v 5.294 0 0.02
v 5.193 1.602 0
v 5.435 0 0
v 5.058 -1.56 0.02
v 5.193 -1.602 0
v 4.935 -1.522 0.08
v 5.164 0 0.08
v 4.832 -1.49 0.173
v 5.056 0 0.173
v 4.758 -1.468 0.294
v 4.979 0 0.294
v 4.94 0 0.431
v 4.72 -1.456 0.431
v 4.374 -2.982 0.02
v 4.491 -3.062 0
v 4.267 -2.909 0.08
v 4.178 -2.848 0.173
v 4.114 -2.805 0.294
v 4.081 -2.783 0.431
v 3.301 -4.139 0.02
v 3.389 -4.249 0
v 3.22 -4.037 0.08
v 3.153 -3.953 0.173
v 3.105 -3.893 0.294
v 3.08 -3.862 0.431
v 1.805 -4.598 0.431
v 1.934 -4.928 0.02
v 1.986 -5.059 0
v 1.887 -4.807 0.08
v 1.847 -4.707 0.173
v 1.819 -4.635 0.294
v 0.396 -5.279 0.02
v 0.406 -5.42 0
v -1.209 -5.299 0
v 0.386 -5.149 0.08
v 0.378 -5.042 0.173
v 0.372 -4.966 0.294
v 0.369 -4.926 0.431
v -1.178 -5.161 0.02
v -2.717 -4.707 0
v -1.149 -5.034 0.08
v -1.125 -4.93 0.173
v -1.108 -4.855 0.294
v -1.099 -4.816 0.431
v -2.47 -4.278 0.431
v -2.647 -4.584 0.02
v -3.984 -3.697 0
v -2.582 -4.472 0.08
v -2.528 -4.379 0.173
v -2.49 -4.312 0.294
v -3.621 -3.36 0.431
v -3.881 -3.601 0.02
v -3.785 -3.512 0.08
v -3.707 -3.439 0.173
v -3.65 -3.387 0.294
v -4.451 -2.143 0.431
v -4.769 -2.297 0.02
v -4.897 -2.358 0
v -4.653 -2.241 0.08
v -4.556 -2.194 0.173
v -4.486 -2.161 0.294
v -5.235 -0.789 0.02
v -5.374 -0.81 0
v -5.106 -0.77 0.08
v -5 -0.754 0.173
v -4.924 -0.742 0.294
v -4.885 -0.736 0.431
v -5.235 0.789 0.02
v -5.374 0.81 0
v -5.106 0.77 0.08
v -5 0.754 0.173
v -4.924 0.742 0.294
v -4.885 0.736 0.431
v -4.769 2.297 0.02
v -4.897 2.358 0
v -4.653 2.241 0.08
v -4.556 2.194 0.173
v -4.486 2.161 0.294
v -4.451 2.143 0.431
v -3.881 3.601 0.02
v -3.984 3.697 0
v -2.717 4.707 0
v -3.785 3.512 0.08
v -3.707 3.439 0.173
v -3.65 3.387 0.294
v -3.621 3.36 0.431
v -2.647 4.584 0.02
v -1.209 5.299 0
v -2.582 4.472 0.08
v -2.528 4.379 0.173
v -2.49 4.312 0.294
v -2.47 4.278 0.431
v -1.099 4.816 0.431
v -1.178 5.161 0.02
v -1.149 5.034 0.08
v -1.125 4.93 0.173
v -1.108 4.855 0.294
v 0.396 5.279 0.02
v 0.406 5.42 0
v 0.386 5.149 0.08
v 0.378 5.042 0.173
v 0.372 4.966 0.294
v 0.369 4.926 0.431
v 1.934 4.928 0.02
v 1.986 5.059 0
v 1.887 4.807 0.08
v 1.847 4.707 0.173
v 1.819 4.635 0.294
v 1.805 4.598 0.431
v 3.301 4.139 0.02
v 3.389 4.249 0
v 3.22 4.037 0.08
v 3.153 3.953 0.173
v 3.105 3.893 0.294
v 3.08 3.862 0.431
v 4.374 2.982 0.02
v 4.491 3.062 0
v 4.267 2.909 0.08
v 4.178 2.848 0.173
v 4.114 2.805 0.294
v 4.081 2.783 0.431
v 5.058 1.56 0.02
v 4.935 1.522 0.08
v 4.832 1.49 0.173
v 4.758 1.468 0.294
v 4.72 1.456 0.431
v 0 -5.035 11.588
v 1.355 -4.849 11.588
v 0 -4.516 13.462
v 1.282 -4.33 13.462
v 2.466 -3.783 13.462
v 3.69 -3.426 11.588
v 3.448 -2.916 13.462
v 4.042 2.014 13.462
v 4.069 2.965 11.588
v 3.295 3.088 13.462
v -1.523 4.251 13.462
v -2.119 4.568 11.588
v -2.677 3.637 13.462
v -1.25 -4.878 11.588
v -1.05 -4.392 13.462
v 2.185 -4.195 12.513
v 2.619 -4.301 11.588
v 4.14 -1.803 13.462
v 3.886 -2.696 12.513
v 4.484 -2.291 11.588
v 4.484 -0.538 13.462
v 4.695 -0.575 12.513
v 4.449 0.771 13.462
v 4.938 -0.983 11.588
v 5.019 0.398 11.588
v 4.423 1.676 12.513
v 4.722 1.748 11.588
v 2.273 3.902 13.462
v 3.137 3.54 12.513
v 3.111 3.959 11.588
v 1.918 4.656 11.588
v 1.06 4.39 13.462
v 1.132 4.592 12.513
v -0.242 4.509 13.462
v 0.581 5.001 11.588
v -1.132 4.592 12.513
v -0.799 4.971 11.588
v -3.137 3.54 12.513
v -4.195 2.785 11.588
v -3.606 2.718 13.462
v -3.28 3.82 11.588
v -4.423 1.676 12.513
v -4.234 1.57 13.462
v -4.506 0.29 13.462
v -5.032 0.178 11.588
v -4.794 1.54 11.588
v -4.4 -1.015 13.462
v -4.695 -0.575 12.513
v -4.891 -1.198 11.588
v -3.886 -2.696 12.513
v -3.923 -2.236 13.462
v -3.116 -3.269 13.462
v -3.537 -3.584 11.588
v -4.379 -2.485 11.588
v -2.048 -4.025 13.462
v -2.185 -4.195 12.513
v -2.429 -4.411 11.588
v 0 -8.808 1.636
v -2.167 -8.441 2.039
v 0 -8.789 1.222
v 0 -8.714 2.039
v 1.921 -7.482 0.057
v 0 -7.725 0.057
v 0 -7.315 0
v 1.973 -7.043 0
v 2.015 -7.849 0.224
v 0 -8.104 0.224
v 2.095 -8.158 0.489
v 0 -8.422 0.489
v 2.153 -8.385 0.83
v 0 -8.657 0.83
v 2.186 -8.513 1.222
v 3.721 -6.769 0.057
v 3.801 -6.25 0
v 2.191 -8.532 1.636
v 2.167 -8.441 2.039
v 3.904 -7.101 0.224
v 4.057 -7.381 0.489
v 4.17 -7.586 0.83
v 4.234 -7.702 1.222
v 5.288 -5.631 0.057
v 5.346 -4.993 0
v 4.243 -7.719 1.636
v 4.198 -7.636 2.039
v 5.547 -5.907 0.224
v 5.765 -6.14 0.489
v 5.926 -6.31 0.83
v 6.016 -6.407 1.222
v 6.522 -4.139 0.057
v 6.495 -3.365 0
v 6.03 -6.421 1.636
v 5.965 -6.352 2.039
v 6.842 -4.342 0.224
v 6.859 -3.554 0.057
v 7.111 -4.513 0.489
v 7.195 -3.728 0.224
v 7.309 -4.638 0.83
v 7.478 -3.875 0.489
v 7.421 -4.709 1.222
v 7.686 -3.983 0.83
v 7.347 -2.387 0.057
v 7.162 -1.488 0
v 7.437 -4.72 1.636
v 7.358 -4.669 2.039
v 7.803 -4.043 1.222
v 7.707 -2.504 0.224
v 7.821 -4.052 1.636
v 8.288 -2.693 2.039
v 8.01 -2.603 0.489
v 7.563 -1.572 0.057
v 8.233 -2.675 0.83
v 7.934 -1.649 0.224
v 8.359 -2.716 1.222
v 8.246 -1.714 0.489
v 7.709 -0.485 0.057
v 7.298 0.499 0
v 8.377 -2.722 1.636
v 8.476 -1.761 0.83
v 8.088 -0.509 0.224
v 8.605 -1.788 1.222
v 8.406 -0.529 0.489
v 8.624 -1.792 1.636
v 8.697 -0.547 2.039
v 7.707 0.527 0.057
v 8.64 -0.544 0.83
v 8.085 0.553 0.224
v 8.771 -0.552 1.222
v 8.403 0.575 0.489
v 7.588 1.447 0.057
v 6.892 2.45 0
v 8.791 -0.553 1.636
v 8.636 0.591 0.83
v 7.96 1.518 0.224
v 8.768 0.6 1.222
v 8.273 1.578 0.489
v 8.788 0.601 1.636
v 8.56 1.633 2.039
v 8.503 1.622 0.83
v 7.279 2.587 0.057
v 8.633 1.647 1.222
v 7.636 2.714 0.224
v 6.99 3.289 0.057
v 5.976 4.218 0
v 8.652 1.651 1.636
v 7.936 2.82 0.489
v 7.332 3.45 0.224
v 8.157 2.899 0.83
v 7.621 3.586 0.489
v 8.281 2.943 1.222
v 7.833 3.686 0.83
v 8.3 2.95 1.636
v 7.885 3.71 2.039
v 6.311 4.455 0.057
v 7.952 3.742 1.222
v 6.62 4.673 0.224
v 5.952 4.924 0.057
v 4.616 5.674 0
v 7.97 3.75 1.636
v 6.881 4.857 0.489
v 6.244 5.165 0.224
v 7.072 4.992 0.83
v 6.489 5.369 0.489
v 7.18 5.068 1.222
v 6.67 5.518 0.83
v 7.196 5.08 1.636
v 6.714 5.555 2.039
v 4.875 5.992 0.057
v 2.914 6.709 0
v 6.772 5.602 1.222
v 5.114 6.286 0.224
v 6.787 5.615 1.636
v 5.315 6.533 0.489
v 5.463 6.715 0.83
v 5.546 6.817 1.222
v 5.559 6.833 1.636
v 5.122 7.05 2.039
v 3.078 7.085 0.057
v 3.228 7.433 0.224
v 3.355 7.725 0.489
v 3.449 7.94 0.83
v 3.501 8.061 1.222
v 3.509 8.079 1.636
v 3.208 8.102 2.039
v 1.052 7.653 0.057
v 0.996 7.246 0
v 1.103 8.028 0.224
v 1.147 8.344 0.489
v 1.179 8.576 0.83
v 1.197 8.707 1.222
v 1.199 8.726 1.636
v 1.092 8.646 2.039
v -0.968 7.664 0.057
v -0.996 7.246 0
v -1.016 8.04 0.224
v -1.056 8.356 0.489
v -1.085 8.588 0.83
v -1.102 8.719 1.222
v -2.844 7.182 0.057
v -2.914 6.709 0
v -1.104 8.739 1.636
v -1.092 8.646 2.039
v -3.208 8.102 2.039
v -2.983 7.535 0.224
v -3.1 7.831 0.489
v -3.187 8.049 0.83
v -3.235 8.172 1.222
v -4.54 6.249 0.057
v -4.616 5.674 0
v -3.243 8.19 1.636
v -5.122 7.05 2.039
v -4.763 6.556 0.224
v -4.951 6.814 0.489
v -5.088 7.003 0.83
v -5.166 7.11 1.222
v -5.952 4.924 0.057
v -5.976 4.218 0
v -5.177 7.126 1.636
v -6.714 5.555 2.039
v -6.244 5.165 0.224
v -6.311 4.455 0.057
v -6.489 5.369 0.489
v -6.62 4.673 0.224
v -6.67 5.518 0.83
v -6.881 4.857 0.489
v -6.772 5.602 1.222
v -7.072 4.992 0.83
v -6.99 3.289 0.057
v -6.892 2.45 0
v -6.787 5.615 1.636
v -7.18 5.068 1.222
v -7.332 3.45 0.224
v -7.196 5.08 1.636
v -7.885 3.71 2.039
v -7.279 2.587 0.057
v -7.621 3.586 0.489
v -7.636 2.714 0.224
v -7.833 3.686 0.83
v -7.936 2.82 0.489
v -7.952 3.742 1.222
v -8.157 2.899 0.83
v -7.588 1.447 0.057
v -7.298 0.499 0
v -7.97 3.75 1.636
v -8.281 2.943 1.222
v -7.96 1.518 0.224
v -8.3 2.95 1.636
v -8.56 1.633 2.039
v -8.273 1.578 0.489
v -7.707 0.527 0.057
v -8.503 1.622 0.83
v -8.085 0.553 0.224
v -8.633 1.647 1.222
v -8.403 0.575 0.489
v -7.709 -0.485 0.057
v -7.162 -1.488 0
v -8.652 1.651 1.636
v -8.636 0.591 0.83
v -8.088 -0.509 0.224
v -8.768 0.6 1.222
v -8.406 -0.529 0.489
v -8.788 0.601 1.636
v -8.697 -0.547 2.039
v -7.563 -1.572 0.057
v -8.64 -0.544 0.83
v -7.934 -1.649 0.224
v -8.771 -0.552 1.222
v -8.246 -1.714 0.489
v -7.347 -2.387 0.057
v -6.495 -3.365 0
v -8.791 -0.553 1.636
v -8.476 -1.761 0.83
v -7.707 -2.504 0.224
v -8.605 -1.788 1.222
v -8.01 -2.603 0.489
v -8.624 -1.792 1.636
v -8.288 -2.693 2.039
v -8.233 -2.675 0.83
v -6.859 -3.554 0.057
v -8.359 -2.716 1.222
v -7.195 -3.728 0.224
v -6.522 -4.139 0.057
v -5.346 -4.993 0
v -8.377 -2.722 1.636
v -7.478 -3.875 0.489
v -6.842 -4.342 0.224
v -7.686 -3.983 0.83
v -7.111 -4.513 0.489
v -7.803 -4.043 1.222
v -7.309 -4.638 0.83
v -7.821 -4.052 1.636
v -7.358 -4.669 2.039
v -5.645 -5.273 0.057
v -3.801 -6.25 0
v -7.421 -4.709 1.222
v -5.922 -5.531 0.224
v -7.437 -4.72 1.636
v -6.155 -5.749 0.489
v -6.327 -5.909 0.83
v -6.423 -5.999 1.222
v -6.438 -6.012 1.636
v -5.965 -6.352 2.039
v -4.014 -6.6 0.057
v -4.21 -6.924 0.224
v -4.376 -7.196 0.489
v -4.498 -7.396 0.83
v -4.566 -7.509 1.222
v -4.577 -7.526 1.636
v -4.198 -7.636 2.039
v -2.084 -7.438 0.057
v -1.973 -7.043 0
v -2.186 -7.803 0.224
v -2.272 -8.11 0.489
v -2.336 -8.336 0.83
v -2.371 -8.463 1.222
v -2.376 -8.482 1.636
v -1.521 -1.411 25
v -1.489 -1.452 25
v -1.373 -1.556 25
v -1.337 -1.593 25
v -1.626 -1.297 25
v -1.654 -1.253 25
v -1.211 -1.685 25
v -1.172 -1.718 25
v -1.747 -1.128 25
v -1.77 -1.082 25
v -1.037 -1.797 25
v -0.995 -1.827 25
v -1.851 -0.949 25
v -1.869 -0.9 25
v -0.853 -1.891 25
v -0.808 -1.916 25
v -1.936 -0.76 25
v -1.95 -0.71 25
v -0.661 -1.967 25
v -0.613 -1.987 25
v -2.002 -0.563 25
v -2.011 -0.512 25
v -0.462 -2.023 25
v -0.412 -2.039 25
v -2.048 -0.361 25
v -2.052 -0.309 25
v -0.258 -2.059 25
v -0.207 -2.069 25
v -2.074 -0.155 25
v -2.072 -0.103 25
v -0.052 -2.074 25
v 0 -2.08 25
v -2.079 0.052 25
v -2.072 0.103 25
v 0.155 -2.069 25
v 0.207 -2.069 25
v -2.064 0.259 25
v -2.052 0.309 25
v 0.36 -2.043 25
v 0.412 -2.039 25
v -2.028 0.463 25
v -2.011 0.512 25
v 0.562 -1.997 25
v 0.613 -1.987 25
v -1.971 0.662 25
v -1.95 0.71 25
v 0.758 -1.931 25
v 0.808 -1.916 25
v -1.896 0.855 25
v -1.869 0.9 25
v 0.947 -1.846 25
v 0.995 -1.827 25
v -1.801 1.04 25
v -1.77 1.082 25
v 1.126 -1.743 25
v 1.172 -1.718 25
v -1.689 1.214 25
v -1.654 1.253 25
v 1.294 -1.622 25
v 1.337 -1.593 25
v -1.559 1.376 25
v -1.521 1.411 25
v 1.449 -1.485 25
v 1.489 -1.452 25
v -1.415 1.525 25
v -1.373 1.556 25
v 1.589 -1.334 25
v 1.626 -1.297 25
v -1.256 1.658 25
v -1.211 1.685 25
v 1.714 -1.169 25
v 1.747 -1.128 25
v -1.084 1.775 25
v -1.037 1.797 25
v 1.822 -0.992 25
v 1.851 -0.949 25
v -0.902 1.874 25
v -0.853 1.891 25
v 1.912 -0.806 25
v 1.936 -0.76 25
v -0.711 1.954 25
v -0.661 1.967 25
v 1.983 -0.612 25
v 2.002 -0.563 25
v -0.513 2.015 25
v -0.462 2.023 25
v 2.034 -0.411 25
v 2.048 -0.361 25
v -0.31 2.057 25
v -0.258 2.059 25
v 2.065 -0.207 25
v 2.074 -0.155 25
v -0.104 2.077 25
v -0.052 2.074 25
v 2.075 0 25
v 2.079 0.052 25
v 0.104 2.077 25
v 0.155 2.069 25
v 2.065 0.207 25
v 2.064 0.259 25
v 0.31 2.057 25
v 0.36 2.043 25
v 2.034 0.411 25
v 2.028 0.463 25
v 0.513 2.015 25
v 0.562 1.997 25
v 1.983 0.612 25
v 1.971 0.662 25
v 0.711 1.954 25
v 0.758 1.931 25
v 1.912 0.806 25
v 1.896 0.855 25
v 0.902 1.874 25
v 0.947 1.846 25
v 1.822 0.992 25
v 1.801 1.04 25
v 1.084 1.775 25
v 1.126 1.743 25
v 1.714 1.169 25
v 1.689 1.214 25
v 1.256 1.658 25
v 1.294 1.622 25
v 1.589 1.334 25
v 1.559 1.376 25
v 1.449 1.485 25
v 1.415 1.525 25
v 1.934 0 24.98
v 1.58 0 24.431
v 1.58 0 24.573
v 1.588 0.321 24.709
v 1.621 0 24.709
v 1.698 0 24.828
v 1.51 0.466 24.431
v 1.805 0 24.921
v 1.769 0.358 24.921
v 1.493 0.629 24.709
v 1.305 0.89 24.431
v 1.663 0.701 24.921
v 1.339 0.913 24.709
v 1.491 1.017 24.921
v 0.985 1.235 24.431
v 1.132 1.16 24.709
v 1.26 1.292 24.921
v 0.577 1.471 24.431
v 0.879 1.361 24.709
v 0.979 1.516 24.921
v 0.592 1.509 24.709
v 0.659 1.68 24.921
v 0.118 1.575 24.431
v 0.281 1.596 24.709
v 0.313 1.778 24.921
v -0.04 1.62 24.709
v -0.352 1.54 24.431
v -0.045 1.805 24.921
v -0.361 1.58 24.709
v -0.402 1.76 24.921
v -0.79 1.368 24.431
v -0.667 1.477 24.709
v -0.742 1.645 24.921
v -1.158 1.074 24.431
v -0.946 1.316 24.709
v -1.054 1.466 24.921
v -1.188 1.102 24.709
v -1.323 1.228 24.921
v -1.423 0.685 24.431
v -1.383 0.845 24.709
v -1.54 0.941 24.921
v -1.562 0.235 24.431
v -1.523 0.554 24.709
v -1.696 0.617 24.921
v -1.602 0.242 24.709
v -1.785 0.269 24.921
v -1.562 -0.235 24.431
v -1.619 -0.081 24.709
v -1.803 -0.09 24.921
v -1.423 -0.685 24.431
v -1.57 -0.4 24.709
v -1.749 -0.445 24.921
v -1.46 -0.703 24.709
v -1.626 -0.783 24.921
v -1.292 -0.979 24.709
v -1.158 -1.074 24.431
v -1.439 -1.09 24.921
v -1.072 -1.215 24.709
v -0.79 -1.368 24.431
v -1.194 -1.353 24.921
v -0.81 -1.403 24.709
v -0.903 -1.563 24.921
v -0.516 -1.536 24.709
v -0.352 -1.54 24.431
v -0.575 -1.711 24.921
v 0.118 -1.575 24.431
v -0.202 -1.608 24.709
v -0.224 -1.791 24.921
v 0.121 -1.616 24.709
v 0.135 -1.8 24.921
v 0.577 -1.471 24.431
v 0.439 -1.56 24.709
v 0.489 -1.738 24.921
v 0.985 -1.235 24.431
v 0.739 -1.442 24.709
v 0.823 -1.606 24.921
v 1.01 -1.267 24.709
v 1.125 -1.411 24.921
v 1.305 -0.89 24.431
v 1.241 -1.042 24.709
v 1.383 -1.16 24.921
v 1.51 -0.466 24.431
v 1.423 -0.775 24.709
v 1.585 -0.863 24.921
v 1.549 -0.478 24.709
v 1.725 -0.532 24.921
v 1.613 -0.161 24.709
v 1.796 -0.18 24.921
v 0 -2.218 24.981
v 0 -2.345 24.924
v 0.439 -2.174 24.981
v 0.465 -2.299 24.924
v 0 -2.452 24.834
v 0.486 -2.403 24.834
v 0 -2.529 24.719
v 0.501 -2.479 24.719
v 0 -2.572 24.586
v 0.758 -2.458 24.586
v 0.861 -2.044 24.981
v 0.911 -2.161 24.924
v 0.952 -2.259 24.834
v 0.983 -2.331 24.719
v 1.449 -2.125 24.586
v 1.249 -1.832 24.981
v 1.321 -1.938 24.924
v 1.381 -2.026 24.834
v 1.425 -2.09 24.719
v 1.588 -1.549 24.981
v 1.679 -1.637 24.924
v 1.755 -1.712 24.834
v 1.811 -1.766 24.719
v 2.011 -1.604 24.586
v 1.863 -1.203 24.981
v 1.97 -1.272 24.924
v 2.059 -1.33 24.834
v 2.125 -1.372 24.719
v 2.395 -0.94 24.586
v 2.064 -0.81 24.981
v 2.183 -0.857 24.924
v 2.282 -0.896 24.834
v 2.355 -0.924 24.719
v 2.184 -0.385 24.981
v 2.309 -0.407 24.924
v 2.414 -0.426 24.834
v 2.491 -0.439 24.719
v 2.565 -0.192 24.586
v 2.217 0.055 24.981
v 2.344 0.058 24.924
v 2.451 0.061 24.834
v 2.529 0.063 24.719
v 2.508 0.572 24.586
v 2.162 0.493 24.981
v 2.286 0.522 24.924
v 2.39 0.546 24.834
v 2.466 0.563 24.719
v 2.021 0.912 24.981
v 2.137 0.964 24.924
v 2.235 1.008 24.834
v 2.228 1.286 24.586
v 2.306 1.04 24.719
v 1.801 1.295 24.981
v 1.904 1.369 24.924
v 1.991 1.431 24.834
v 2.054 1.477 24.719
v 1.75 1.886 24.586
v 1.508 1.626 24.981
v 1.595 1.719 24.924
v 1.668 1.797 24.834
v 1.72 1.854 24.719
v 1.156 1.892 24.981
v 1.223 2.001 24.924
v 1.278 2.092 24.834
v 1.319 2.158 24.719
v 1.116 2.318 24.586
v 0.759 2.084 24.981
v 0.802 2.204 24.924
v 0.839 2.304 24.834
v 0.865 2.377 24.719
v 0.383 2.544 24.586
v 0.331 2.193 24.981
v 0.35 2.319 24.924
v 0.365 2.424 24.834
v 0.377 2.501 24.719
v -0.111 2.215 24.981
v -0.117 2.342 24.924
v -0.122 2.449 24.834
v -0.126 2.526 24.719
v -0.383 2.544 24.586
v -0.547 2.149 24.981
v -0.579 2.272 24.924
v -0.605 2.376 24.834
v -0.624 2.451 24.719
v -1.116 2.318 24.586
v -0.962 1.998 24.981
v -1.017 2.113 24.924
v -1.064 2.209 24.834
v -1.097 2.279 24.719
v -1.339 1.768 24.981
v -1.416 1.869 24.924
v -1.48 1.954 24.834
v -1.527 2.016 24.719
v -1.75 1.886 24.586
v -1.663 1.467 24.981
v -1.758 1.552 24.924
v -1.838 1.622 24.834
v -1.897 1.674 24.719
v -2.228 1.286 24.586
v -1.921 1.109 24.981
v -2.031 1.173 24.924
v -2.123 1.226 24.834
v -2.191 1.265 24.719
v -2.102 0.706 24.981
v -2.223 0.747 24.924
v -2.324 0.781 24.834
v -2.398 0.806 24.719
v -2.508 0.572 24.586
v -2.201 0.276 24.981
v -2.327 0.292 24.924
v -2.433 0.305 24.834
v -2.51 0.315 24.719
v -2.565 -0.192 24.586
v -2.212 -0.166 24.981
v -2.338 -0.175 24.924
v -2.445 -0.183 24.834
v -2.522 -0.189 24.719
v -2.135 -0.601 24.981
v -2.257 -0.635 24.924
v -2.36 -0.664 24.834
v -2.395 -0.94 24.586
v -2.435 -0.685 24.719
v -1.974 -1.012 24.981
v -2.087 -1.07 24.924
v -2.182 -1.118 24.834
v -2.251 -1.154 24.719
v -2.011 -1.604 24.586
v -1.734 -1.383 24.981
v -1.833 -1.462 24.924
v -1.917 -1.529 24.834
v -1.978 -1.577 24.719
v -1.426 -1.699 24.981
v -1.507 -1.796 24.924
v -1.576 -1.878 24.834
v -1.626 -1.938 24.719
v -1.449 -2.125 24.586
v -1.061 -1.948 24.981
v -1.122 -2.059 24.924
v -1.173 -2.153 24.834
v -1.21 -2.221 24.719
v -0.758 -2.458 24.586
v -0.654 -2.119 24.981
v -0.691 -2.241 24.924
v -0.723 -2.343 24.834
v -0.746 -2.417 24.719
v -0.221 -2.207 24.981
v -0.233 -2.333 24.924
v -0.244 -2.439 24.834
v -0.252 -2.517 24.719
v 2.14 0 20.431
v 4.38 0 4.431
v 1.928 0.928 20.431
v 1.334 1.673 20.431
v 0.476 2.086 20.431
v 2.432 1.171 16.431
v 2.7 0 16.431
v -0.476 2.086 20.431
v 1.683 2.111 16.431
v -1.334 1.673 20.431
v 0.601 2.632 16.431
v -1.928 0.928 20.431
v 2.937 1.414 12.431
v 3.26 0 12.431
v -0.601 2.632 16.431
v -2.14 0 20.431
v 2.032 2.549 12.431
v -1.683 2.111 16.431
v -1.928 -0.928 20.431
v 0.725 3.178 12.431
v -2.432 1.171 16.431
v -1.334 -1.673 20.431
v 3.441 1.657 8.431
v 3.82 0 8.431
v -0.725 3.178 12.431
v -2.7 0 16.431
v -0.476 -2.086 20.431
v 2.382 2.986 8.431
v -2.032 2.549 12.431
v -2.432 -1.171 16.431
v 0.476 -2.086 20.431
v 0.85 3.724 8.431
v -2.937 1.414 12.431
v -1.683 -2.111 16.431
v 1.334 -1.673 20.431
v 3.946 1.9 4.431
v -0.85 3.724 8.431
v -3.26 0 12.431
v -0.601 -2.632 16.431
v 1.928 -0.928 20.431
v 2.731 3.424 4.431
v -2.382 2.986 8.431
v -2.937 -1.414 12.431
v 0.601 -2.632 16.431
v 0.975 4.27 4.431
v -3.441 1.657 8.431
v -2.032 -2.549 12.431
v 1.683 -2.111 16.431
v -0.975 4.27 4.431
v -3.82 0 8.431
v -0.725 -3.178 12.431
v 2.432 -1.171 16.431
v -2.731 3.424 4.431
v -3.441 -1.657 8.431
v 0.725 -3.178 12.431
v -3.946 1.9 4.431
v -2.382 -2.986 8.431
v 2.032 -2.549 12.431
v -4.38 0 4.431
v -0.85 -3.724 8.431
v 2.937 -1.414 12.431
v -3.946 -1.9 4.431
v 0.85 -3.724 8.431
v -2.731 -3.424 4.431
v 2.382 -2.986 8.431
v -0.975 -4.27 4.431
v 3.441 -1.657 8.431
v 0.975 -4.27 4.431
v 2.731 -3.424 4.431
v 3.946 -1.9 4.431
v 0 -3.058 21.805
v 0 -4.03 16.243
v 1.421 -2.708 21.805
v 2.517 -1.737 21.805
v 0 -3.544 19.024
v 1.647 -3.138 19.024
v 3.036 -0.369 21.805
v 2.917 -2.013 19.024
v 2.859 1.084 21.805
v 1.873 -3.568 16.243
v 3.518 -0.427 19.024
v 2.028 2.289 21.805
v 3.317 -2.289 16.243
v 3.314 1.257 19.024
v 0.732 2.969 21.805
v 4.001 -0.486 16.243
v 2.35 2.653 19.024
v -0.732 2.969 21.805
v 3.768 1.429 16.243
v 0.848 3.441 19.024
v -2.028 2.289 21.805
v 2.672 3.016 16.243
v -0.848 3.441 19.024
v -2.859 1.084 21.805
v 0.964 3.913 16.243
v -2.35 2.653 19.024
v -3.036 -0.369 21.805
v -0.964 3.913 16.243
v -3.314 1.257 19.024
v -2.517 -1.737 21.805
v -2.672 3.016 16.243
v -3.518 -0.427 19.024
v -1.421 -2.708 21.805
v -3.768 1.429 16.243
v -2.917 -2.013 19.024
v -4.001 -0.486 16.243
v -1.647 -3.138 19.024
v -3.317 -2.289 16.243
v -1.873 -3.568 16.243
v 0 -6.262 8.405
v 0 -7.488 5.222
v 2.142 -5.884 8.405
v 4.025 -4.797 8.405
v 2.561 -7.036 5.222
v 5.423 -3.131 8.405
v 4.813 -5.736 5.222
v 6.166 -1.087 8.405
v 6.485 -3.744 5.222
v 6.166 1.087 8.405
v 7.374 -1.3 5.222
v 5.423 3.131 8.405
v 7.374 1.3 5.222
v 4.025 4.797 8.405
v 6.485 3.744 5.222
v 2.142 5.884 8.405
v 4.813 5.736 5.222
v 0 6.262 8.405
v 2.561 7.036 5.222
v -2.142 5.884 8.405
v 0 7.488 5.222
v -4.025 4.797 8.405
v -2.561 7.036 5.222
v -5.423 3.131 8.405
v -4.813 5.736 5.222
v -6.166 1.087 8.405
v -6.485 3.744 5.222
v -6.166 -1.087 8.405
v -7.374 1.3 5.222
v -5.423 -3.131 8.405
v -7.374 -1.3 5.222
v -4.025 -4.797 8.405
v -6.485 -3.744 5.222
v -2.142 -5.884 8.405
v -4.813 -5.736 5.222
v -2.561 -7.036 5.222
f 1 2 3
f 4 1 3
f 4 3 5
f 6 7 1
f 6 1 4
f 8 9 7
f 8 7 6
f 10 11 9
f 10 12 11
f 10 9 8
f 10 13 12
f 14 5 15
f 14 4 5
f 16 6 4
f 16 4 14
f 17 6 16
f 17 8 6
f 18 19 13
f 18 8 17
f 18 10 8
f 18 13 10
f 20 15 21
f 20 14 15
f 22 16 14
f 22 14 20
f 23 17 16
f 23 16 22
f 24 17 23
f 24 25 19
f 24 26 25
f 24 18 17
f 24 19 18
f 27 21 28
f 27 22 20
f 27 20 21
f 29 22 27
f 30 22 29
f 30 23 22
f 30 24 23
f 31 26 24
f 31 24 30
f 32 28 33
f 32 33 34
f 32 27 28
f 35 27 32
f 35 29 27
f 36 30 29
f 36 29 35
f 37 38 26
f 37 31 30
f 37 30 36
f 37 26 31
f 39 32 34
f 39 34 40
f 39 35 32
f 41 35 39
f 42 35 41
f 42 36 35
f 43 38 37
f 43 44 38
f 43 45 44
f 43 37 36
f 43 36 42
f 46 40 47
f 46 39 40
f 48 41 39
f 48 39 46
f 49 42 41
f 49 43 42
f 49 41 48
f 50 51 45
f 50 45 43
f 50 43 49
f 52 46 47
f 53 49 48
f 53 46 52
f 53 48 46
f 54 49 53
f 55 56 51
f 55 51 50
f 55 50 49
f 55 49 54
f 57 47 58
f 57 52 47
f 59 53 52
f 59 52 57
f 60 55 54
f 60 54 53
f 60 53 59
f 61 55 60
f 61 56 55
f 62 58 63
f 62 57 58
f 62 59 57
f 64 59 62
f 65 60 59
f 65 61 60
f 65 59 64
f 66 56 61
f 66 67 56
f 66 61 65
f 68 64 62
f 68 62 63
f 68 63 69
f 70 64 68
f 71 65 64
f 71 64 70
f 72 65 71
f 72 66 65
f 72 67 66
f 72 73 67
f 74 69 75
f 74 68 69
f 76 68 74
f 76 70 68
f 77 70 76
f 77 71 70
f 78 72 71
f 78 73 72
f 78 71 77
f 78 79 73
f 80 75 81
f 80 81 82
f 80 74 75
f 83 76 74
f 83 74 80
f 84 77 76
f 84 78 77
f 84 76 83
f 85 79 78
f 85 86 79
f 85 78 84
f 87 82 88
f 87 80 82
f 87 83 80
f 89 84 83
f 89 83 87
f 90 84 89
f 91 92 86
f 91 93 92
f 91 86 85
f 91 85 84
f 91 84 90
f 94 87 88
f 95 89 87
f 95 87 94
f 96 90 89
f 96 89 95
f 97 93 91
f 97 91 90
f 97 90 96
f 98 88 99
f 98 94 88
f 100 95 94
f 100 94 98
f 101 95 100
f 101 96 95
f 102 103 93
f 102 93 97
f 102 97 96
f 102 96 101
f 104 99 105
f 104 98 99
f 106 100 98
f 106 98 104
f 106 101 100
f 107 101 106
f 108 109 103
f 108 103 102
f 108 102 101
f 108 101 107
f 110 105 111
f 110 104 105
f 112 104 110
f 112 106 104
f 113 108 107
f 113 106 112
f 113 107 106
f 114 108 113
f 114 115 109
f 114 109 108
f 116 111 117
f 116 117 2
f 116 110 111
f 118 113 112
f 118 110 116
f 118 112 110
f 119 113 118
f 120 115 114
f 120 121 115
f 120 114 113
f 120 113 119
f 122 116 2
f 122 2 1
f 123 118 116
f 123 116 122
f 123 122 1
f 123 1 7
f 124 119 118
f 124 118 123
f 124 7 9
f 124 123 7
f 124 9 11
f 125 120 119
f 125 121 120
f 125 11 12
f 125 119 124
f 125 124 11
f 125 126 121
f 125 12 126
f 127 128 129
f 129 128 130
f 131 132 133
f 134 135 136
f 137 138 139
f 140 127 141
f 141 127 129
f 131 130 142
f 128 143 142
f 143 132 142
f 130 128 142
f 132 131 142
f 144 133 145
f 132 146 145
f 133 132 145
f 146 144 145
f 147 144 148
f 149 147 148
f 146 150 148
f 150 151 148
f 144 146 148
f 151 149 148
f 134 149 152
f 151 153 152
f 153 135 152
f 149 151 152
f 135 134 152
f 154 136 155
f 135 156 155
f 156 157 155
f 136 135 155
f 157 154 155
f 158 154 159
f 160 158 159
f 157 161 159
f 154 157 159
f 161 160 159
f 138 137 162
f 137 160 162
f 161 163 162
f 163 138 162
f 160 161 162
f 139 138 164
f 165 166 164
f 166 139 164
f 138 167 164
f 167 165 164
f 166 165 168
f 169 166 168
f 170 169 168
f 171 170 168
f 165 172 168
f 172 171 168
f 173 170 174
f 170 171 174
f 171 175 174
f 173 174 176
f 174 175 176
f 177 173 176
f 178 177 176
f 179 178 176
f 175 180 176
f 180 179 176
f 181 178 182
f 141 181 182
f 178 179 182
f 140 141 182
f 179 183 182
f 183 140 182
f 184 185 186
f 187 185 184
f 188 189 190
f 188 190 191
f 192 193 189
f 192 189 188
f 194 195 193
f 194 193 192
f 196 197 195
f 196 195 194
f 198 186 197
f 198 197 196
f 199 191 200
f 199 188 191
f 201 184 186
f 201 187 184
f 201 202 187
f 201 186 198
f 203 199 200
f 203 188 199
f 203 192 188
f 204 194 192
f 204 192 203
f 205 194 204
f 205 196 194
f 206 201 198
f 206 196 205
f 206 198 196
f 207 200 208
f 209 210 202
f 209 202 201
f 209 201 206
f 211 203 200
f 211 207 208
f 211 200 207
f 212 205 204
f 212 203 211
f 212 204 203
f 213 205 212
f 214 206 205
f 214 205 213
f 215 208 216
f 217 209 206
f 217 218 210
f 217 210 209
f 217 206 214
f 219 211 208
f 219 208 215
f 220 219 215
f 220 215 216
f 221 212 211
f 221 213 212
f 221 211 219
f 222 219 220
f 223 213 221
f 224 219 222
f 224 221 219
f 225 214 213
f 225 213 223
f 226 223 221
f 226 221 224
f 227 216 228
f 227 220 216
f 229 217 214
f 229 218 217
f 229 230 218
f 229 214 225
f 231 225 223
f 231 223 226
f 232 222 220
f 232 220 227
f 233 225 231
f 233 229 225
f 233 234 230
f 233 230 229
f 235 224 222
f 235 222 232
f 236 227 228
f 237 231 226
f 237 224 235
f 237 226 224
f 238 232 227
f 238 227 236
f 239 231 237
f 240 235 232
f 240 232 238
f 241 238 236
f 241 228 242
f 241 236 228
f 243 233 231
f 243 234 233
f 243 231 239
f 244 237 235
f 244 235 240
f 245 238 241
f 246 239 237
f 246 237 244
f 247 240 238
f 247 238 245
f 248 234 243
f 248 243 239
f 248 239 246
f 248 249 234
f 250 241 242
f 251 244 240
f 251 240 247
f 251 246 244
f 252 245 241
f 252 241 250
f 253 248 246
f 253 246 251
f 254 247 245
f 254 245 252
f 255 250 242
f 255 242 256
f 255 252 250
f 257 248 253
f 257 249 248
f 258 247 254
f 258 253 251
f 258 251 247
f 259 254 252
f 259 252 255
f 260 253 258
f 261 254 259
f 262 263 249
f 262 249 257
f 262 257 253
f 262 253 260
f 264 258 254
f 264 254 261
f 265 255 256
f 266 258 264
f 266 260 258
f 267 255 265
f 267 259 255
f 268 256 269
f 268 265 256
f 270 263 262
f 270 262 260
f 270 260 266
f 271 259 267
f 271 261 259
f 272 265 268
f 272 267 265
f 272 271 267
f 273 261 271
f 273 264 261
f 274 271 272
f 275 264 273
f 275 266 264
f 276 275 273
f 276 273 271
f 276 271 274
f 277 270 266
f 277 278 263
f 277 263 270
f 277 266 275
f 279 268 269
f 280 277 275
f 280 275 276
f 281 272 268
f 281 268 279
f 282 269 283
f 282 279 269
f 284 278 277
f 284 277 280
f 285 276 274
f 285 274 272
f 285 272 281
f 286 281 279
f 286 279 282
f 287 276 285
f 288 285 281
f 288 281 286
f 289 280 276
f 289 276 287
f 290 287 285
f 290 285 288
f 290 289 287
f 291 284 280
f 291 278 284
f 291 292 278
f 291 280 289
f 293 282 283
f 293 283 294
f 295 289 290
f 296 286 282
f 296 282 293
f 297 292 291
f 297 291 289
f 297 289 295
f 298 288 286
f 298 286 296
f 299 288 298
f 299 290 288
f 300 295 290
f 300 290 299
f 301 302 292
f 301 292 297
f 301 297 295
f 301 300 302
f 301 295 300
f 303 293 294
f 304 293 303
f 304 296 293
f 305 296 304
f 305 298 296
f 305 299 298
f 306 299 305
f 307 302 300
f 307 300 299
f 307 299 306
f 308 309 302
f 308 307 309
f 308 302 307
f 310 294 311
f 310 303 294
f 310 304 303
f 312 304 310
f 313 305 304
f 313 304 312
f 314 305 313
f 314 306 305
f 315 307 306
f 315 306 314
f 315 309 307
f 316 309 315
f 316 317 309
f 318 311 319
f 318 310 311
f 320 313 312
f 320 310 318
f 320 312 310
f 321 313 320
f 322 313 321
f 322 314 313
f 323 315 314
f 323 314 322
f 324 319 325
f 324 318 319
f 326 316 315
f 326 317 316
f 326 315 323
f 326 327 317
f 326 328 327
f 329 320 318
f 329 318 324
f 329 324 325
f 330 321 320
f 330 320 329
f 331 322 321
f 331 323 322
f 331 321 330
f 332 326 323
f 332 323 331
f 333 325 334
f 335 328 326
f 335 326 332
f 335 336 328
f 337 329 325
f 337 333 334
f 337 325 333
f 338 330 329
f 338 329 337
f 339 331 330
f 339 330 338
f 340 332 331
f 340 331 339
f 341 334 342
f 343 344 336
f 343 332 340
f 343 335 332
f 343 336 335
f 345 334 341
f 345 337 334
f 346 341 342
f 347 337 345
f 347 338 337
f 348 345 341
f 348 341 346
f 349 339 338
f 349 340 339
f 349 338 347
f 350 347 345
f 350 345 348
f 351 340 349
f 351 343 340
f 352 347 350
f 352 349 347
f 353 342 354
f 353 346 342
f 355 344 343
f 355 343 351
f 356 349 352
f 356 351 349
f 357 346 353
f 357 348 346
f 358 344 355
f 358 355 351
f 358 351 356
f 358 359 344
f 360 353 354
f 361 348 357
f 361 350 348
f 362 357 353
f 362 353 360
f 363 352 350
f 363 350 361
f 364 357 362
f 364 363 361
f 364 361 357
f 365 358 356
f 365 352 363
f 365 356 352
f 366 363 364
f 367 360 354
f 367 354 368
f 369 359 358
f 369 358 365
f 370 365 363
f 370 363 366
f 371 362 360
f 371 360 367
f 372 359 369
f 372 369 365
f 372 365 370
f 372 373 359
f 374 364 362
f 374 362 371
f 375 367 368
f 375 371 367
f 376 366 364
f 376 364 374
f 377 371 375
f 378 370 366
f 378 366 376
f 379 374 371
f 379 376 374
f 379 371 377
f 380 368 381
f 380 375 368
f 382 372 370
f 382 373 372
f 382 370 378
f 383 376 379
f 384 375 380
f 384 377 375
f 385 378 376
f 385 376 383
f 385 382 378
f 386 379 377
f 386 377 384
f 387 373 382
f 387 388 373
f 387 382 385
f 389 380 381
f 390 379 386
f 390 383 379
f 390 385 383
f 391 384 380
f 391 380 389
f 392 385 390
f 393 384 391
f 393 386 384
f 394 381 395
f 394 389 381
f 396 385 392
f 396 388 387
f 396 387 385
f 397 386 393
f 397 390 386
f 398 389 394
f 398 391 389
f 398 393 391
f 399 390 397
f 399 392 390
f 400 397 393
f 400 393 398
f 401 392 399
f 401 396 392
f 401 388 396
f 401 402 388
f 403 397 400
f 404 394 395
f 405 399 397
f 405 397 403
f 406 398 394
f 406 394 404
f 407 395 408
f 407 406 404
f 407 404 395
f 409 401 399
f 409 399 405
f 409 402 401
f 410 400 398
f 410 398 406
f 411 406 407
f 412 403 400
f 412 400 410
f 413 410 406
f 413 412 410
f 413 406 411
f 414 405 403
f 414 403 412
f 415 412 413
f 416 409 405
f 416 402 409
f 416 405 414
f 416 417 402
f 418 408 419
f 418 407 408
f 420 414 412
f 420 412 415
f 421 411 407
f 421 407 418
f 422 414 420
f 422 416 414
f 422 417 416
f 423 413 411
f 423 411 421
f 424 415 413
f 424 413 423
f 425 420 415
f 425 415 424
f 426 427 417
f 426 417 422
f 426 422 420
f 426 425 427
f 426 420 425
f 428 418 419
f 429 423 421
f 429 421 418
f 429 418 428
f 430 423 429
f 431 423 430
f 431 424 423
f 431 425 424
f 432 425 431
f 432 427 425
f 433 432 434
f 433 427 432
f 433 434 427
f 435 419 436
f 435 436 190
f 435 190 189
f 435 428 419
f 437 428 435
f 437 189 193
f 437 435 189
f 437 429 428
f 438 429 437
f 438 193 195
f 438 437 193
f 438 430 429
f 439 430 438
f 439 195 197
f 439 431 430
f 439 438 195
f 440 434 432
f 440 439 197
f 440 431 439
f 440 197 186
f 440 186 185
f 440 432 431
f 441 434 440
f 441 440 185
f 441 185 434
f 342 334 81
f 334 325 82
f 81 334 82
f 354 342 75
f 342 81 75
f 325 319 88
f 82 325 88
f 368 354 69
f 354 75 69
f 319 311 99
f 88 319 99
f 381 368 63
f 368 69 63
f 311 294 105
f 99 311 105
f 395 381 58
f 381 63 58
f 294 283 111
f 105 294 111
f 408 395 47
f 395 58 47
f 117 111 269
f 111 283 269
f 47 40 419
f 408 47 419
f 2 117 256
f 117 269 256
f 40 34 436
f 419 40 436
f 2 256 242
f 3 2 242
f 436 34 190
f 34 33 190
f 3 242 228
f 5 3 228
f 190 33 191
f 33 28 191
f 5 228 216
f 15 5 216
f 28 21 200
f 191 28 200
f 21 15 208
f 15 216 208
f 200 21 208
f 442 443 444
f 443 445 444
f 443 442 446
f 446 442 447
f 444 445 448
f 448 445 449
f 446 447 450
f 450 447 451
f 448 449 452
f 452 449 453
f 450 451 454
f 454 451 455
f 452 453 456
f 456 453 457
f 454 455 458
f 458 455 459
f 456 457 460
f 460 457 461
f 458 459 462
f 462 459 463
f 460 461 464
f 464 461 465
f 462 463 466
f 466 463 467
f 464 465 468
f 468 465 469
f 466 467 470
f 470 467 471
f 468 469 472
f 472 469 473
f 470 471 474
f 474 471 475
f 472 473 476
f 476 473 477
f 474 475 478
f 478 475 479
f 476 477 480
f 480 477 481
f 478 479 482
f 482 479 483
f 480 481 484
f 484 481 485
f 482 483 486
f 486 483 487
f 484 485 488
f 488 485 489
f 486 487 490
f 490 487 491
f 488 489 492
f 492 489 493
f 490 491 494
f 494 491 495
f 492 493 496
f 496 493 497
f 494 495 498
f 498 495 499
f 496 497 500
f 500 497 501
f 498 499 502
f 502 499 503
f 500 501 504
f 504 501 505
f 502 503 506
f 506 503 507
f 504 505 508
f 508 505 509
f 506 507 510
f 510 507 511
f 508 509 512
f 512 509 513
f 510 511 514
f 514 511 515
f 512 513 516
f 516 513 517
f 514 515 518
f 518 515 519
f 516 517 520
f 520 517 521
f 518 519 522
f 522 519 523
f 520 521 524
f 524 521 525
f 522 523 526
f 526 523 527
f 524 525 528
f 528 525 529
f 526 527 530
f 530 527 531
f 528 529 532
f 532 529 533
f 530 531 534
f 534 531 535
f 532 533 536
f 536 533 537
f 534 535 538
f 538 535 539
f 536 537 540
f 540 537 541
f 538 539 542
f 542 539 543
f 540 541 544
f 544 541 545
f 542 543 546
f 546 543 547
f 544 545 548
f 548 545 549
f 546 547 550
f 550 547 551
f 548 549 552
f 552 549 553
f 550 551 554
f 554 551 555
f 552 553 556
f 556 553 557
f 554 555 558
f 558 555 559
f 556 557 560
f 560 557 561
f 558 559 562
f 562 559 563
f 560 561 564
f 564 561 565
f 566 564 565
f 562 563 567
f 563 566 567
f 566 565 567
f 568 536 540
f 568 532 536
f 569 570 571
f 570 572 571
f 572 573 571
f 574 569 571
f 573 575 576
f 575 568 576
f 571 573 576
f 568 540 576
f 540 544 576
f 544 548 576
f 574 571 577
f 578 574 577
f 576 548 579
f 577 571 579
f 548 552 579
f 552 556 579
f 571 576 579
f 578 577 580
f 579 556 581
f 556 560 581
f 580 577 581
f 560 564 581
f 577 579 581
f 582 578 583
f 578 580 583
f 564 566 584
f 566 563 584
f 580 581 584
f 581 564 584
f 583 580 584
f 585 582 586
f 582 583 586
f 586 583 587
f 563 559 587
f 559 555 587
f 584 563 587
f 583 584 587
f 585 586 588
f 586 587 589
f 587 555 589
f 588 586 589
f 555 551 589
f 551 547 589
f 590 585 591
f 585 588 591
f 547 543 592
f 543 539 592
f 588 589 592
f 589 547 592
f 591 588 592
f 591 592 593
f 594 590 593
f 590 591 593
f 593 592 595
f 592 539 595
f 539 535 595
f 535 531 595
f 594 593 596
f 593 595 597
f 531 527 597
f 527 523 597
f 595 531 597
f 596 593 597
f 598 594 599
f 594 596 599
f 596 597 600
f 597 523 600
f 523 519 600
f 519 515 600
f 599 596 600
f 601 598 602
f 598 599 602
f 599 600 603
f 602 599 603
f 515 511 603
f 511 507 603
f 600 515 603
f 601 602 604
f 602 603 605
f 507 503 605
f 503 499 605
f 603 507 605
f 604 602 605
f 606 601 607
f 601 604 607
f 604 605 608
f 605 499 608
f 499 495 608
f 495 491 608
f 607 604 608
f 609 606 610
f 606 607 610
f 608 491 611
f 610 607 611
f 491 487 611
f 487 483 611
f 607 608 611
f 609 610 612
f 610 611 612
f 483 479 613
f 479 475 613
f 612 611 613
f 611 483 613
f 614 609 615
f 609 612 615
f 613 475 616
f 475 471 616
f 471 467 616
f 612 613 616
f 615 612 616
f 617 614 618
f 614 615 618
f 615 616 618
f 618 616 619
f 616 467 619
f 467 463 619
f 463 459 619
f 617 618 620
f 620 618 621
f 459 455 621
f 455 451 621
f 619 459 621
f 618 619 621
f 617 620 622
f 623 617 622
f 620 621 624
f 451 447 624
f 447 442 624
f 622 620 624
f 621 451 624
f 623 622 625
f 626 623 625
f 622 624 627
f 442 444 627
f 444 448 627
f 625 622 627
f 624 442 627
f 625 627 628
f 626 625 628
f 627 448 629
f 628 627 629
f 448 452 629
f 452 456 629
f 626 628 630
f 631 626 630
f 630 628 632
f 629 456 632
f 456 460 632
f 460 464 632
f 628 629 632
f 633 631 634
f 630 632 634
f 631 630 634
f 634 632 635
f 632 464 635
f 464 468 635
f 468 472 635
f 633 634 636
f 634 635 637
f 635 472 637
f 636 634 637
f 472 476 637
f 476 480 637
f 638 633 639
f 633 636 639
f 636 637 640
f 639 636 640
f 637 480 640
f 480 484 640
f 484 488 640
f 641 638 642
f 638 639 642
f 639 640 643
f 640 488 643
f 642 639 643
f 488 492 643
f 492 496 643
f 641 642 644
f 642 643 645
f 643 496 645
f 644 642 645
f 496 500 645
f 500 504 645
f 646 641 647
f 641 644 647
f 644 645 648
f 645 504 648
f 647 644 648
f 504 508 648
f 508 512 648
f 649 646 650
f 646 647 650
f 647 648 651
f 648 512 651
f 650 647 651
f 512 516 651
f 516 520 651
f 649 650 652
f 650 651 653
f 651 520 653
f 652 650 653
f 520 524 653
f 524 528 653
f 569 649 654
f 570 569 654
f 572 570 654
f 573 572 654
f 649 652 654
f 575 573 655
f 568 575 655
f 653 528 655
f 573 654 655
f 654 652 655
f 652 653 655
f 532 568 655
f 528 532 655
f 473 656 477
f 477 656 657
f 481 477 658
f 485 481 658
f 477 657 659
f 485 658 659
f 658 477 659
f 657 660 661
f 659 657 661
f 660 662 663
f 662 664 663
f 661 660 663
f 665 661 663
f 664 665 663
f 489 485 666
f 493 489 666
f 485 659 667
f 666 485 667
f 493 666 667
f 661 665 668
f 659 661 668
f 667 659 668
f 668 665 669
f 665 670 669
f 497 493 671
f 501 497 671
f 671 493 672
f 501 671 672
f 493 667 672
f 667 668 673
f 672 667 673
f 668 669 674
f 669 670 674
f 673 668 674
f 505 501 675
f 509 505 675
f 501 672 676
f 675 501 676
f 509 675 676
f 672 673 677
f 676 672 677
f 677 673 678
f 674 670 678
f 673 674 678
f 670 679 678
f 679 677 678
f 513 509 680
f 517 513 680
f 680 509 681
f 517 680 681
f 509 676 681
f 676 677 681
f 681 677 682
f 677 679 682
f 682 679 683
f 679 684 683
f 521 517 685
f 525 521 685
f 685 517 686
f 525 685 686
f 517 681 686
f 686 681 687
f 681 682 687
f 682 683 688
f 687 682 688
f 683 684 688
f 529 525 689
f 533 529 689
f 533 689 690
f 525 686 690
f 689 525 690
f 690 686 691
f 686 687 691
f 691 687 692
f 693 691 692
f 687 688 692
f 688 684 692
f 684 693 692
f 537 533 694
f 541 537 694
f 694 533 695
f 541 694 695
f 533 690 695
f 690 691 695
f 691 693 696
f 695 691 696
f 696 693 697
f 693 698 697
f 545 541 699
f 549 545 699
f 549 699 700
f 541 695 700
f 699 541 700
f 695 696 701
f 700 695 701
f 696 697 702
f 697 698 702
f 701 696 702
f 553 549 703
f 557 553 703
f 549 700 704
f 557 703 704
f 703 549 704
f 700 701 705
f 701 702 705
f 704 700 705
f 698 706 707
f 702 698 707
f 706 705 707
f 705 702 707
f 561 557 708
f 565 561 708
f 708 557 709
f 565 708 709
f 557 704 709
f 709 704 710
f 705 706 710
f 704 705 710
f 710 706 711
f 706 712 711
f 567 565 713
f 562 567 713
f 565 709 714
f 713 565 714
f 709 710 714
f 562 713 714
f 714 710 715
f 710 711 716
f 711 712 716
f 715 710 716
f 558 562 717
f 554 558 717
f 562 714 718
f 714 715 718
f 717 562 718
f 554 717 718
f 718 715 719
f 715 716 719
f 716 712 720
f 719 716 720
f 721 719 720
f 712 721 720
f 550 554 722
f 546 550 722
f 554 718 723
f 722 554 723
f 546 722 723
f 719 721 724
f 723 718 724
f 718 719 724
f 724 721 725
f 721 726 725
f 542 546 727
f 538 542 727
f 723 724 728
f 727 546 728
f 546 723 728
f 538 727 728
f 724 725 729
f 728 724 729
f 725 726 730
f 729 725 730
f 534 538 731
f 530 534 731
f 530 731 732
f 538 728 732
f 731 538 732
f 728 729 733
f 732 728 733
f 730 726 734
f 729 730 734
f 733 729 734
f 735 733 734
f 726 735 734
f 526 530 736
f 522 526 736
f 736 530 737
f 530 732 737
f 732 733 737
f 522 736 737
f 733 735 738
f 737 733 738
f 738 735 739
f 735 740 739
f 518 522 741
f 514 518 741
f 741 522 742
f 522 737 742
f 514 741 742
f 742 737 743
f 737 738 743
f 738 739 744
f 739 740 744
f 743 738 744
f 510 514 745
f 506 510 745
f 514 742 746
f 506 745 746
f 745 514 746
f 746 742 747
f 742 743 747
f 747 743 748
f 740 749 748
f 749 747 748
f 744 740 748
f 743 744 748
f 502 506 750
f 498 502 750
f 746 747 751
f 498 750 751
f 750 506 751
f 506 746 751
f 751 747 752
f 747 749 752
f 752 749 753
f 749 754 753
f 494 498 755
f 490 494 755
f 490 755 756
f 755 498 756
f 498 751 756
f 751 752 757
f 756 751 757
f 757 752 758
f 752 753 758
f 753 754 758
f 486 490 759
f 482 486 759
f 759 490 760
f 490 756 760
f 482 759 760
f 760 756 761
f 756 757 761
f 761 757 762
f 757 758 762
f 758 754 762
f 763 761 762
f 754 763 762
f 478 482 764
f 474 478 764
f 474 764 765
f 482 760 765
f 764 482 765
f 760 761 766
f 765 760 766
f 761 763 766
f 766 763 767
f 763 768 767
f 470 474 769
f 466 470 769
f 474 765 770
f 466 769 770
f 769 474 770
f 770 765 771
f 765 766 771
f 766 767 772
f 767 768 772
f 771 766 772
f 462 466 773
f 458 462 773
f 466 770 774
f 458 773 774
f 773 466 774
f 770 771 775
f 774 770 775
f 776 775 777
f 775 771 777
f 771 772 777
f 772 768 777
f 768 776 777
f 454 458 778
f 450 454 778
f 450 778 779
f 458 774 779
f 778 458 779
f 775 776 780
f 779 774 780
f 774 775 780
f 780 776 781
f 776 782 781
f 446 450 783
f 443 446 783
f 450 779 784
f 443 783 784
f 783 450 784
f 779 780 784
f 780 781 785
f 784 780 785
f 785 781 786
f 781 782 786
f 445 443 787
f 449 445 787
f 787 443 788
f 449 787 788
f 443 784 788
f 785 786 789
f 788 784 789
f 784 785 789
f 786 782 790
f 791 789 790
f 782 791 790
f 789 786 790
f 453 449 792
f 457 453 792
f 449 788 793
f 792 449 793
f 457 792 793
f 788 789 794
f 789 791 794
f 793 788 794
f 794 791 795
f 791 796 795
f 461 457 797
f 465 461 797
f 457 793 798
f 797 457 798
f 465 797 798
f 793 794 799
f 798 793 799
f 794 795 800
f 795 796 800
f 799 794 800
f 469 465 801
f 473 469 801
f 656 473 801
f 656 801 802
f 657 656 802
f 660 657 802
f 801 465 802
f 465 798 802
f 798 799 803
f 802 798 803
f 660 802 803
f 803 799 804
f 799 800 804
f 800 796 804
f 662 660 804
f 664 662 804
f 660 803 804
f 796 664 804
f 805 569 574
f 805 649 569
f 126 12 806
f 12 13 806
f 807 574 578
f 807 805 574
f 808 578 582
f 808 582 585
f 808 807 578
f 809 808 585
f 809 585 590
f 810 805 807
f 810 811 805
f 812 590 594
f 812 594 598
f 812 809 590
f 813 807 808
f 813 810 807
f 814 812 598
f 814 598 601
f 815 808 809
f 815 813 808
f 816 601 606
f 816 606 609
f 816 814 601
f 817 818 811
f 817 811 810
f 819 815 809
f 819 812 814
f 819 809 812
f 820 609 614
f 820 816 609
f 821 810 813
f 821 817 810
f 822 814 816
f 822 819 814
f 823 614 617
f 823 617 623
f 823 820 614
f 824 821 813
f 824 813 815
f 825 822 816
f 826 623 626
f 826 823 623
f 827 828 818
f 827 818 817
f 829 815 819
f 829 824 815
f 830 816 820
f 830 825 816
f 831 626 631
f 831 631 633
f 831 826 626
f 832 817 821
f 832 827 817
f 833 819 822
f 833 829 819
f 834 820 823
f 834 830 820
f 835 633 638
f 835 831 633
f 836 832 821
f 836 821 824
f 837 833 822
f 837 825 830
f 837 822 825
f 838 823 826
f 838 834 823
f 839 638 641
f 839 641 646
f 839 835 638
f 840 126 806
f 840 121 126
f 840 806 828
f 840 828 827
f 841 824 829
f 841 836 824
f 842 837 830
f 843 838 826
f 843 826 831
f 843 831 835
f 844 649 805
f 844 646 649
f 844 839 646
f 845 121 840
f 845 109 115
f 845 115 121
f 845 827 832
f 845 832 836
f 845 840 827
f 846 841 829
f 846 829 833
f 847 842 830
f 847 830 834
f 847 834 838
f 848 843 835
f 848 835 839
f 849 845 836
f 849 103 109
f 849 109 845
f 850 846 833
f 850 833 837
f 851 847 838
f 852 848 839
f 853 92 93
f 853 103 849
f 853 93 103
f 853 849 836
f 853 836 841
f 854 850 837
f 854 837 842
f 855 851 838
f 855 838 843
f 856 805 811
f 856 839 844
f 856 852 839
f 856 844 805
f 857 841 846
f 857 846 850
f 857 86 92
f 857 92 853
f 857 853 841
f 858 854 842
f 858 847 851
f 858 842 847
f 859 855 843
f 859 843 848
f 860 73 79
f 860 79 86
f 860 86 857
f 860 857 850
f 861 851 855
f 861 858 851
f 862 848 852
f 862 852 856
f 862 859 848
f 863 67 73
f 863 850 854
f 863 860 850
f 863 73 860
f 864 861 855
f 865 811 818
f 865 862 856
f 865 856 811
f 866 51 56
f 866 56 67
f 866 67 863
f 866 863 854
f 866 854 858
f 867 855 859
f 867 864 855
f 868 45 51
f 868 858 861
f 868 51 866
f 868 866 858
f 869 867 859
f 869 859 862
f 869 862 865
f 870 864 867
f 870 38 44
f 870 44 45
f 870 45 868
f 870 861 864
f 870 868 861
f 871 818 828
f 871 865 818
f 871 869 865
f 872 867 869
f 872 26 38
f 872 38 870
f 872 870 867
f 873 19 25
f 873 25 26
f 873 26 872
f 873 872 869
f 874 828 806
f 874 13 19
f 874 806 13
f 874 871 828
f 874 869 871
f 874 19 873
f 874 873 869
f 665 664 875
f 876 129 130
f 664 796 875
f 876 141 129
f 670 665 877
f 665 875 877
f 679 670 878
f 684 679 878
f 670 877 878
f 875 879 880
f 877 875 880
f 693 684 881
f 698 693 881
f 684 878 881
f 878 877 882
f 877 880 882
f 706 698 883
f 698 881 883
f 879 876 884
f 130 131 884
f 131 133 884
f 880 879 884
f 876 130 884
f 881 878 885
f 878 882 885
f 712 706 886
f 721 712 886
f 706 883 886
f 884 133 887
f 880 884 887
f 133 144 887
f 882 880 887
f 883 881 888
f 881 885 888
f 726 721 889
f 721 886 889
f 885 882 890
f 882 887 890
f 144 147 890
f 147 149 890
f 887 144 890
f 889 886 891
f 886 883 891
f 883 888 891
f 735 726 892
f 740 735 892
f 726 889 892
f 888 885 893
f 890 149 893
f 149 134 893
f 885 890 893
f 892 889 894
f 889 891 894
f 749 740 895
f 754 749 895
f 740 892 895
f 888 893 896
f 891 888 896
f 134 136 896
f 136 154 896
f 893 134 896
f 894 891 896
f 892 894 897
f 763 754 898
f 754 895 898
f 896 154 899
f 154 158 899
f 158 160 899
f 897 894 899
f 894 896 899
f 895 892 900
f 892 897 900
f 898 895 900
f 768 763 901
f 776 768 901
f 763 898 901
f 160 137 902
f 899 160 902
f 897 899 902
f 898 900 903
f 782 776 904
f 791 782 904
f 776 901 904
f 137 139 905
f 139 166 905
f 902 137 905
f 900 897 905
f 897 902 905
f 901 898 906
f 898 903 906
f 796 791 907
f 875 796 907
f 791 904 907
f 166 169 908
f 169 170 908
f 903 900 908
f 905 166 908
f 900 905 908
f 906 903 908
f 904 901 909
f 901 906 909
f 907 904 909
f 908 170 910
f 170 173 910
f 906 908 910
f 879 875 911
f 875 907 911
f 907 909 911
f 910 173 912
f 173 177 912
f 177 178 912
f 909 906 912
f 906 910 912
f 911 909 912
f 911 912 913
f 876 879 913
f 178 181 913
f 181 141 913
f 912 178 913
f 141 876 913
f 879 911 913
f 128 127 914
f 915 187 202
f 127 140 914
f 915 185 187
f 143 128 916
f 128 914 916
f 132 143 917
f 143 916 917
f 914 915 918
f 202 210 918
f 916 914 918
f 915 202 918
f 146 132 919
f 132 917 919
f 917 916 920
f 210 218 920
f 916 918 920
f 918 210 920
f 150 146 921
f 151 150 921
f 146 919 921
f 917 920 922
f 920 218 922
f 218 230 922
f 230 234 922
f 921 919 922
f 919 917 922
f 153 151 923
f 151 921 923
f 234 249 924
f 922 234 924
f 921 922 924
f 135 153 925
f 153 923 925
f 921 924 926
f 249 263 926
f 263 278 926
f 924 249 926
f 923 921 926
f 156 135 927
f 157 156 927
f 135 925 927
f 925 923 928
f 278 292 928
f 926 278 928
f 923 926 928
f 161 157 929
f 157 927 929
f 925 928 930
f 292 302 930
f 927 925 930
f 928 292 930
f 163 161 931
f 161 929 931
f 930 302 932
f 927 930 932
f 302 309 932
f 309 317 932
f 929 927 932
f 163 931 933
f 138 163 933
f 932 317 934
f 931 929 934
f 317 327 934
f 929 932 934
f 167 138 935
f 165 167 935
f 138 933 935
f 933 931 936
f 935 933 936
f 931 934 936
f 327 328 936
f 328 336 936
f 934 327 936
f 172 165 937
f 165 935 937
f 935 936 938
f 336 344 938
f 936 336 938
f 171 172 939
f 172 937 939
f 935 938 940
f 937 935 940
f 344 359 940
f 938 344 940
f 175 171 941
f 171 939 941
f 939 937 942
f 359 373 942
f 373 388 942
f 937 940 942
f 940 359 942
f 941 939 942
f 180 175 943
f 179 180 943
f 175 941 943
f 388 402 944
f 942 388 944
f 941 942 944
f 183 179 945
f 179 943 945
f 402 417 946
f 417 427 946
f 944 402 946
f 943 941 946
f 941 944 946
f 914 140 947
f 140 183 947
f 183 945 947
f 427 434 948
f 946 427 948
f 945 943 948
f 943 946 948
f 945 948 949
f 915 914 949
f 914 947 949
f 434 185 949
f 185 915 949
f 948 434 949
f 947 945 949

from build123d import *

# Parameters (mm, degrees)
F3_R = 1.5
F2_R = 5
F5_R = 1.5
F6_R = 0.5
F7_R = 10


with BuildPart() as f1:
    # F0 (on Right) → F1 (revolve)
    with BuildSketch(Plane.YZ):
        Polygon((-9.5, 0), (0, 0), (0, 25), (-2.5, 25), (-4.683943931, 12.5), align=None)
    revolve(axis=Axis((0, 0, 12.5), (0, 0, 1)))

    # F3 (on face) → F4 section 0
    with BuildSketch(Plane.XY.offset(25)):
        Circle(F3_R)
    # F2 (on face) → F4 section 1
    with BuildSketch(Plane(origin=(0, 0, 0), x_dir=(1, 0, 0), z_dir=(0, 0, -1))):
        Circle(F2_R)
    loft(mode=Mode.SUBTRACT)

    # F5
    f5_edges = [f1.edges().sort_by_distance(p)[0] for p in [
        (0, 9.5, 0),
    ]]
    fillet(f5_edges, radius=F5_R)

    # F6
    f6_edges = [f1.edges().sort_by_distance(p)[0] for p in [
        (-5, 0, 0),
        (0, 2.5, 25),
        (-1.5, 0, 25),
    ]]
    fillet(f6_edges, radius=F6_R)

    # F7
    f7_edges = [f1.edges().sort_by_distance(p)[0] for p in [
        (0, 4.683944, 12.5),
    ]]
    fillet(f7_edges, radius=F7_R)


solid = f1.part
